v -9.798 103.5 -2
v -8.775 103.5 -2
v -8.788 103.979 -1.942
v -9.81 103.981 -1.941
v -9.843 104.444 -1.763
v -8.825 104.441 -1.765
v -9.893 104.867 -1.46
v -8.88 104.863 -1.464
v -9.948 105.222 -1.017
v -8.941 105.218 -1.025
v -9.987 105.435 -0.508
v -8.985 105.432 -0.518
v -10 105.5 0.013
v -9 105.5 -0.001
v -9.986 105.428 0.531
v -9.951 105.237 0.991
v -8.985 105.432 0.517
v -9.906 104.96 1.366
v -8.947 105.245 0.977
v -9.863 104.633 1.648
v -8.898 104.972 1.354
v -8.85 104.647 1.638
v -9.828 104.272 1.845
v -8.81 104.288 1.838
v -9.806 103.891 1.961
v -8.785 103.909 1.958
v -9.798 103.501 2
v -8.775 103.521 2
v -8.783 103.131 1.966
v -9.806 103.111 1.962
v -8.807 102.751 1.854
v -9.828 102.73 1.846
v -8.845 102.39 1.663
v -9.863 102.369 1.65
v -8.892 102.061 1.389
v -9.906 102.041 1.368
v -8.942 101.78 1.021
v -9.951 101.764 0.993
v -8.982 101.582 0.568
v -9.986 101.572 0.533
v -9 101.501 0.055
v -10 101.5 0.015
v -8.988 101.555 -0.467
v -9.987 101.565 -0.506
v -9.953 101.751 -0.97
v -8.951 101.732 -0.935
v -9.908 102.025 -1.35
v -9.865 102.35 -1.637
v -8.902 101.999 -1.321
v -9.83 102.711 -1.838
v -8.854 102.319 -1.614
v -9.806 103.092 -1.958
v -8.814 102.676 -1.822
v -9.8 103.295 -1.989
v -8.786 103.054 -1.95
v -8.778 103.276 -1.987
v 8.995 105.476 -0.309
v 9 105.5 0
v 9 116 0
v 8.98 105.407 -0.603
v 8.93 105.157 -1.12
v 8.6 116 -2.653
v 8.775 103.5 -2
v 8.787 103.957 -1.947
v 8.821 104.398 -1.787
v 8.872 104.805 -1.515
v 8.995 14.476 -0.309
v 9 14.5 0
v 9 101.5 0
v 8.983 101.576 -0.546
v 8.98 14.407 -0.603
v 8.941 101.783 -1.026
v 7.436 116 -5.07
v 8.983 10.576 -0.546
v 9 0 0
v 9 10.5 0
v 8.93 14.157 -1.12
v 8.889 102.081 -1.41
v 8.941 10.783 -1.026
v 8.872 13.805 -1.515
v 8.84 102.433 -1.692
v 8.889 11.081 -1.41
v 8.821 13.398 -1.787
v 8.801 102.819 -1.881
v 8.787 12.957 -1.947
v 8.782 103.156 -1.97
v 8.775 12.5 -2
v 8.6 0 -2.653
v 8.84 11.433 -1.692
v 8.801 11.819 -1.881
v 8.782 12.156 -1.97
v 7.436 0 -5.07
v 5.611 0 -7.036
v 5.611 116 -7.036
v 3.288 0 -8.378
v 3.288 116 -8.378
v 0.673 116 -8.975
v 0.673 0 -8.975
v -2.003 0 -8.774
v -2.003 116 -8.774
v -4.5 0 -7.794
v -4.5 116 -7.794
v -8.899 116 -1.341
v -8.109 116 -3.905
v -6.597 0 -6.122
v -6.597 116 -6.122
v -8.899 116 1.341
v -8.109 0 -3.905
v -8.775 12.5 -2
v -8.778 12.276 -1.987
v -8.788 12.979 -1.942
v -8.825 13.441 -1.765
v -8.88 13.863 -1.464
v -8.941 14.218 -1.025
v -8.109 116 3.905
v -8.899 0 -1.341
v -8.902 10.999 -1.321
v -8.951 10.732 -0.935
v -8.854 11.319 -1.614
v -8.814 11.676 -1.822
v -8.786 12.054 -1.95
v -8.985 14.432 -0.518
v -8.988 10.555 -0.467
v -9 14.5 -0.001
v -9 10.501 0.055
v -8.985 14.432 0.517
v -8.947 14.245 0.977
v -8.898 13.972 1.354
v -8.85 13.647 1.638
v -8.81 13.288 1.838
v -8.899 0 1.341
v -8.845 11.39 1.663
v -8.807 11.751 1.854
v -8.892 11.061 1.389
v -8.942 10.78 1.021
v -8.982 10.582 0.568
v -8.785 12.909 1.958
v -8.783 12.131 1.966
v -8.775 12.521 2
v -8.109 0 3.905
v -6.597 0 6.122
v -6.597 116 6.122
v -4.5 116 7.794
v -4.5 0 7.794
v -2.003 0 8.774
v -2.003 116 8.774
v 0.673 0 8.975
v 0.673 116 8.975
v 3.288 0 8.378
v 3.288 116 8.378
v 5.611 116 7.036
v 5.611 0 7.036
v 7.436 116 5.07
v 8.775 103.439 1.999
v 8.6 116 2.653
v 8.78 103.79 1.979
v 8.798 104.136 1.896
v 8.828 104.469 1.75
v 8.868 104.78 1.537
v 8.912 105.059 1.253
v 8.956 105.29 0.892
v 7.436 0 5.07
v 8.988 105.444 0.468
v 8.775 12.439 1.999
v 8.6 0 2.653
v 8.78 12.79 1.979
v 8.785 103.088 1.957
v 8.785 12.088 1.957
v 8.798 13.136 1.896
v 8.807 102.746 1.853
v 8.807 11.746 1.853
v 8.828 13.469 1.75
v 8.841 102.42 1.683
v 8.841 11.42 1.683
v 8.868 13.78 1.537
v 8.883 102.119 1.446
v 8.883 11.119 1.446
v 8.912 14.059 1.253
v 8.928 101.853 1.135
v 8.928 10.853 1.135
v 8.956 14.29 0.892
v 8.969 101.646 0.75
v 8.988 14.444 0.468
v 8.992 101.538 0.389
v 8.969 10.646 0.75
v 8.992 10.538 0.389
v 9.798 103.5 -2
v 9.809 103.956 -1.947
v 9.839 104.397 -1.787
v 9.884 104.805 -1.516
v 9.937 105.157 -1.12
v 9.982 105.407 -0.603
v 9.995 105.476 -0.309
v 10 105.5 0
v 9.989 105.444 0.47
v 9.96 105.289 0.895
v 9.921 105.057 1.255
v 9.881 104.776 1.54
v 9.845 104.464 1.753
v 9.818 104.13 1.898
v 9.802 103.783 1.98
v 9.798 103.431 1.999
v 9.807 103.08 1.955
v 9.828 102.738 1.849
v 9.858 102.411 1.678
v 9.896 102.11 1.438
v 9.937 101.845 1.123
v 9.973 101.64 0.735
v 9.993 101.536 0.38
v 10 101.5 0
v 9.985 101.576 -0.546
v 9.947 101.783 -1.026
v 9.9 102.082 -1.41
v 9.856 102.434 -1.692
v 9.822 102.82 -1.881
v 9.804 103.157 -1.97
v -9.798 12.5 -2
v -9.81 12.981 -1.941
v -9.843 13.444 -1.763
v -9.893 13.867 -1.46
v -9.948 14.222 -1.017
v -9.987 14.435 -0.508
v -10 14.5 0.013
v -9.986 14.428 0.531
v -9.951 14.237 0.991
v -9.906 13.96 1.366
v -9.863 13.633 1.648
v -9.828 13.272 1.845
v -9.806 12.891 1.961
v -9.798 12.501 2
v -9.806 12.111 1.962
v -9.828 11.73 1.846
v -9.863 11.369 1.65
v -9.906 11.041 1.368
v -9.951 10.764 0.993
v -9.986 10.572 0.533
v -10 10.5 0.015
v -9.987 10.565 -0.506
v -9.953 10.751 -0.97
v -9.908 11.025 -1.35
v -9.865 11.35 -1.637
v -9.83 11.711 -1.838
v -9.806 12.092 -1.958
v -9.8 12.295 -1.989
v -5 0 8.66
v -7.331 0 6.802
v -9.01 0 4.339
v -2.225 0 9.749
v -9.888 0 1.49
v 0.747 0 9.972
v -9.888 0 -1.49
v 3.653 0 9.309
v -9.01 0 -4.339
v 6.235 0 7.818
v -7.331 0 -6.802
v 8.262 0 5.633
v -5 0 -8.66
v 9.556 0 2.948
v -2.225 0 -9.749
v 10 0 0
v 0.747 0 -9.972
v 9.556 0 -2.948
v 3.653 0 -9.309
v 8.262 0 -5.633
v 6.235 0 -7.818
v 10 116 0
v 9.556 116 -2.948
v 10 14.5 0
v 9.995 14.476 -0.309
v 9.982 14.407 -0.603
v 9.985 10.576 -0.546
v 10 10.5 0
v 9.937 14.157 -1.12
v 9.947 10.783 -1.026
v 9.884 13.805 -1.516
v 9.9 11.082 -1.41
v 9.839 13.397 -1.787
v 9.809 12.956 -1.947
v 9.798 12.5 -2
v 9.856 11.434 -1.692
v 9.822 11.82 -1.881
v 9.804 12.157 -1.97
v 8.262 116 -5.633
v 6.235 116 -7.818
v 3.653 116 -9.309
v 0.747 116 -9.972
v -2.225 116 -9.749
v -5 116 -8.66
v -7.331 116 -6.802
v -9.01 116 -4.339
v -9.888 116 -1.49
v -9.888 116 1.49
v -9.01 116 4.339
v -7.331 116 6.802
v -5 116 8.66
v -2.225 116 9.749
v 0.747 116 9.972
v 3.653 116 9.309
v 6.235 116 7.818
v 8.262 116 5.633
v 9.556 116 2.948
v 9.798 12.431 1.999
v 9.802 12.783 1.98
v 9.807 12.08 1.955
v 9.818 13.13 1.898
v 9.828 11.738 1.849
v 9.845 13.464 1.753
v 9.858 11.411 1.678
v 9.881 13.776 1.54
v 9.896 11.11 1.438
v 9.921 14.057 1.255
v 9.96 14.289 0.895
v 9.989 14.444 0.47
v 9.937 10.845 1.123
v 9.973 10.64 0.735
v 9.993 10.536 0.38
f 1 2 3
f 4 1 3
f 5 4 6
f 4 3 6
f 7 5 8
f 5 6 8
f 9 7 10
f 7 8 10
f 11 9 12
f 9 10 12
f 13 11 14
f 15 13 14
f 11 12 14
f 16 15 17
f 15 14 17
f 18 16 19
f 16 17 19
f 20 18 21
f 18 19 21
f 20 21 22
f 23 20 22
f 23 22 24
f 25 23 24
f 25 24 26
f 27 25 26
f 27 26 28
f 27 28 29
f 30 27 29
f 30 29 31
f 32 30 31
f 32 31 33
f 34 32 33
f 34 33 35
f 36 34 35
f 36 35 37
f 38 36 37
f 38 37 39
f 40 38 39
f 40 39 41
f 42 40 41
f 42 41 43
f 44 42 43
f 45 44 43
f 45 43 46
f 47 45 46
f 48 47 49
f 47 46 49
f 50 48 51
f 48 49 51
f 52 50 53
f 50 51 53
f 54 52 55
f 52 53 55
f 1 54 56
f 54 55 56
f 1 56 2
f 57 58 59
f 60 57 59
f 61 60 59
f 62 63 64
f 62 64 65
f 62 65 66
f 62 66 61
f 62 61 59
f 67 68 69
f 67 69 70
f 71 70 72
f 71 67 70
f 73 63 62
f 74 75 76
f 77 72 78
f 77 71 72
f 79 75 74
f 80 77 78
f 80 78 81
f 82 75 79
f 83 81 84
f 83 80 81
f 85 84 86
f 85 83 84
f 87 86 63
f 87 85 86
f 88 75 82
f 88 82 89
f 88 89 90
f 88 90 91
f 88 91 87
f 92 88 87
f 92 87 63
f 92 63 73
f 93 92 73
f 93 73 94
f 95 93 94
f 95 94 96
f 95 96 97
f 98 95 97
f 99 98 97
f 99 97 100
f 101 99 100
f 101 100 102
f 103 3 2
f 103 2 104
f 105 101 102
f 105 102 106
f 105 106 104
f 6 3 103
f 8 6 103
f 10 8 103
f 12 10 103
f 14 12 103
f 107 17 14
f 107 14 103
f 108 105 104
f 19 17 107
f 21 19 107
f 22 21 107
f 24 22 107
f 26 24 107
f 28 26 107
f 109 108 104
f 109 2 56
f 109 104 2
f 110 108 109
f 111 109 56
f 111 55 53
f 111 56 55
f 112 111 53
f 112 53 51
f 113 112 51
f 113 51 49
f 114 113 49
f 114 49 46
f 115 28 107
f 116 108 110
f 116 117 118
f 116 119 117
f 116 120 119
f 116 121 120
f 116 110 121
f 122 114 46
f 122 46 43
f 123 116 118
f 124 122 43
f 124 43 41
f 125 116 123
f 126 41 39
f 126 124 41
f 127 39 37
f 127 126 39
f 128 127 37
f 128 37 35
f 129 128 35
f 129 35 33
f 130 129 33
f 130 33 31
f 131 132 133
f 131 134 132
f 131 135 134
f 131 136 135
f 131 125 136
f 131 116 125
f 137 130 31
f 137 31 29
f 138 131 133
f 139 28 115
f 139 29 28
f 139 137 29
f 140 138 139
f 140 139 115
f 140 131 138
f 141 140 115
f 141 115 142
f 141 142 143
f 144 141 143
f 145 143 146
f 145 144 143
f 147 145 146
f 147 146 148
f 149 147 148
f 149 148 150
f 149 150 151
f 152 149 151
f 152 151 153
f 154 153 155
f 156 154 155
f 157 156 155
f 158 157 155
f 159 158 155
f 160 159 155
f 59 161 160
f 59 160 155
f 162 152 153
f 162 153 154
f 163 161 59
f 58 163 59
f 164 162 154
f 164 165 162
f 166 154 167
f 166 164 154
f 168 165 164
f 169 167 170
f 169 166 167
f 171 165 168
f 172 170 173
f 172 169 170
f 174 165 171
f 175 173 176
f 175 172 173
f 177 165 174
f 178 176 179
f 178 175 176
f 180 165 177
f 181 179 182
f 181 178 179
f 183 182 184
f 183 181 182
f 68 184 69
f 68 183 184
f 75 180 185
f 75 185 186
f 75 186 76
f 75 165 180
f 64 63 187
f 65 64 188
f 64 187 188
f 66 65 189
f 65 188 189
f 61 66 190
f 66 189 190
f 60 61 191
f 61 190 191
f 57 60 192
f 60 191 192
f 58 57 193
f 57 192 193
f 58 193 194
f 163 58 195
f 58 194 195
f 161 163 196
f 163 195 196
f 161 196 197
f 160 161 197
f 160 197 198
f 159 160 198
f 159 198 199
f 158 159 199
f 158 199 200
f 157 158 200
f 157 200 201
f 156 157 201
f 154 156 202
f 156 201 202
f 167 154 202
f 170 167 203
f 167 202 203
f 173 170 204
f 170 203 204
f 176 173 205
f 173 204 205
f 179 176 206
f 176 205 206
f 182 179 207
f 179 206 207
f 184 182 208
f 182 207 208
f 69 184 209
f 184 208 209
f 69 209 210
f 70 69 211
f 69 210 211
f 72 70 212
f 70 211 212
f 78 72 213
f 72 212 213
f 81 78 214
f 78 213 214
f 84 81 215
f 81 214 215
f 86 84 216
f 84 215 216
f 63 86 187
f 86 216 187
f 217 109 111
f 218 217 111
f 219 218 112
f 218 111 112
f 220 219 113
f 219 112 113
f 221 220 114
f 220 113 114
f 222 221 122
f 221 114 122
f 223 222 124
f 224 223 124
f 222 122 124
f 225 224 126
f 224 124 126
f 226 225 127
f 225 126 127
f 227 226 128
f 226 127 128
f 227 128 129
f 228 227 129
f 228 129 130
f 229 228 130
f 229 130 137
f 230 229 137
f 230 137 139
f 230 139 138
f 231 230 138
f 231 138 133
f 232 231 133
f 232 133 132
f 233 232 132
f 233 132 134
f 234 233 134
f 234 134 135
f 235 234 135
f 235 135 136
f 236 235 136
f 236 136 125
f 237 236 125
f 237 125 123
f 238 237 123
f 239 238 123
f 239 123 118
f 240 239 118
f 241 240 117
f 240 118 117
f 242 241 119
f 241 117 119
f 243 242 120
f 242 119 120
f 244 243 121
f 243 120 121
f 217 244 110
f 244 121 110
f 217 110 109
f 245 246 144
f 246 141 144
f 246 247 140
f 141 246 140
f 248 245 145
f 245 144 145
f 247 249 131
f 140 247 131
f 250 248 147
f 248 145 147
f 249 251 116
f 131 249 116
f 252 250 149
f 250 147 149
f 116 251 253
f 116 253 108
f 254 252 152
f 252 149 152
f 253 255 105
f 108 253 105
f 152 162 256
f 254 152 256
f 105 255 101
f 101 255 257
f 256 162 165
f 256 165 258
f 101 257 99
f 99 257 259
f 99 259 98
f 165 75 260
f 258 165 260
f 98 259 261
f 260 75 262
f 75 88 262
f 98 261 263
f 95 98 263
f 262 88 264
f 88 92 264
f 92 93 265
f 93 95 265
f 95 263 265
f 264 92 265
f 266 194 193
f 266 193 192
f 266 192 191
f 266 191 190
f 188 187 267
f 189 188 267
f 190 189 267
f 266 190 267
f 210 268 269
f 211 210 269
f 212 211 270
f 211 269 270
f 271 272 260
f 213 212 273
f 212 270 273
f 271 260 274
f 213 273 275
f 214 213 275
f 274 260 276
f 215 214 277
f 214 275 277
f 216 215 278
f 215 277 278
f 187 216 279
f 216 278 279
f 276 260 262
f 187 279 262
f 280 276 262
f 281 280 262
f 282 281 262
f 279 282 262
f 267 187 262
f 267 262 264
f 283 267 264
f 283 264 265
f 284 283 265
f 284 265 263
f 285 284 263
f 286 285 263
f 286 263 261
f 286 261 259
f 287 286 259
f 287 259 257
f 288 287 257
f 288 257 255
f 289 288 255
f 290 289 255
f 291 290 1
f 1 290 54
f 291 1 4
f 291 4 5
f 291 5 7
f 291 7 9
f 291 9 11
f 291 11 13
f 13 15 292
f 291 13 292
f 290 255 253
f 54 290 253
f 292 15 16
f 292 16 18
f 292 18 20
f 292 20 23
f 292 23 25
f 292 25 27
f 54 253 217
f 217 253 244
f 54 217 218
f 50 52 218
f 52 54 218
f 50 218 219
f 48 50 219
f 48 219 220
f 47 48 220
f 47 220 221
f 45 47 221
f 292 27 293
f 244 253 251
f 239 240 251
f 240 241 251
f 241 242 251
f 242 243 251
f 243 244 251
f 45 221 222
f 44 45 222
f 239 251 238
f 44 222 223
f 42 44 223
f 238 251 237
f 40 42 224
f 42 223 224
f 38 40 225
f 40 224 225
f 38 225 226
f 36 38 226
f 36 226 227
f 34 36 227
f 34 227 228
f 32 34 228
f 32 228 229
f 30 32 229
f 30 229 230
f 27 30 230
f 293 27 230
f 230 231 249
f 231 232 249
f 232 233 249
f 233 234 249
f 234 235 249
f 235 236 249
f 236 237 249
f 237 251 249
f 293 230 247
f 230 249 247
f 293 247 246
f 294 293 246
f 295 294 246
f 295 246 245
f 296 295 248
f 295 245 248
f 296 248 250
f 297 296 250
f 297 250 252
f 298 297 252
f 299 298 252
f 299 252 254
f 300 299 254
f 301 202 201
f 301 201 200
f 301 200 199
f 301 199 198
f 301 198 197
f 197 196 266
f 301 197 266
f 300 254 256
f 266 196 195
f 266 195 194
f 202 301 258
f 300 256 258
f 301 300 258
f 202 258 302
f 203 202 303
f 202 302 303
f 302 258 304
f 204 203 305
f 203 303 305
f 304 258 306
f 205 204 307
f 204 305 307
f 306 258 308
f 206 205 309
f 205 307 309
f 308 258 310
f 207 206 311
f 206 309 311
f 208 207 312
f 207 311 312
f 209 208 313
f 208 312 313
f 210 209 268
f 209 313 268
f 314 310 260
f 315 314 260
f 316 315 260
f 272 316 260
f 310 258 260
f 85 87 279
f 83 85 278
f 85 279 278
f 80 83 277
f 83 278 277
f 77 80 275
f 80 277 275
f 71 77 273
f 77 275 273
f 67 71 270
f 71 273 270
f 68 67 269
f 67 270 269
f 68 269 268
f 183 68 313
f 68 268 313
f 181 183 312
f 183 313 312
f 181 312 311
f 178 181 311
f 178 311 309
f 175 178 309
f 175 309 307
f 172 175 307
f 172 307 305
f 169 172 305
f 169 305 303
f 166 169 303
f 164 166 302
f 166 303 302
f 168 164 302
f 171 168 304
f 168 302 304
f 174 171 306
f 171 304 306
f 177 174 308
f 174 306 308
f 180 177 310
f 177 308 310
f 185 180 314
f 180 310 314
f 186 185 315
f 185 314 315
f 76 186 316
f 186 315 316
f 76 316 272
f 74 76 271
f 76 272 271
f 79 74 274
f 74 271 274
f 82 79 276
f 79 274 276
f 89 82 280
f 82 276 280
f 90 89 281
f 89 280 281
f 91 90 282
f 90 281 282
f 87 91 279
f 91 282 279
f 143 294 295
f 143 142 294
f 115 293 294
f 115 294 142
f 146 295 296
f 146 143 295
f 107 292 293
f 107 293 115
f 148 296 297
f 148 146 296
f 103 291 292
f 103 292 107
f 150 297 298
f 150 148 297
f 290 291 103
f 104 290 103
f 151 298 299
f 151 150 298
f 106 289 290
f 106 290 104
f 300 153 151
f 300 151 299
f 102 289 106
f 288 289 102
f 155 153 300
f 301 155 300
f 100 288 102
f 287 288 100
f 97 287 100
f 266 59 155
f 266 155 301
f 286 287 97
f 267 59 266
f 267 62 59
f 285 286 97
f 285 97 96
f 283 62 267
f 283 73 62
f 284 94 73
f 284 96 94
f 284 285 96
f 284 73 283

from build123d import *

# Parameters (mm, degrees)
SKETCH1_R           = 10
SKETCH1_R_2         = 9
BOSS_EXTRUDE1_DEPTH = 116
SKETCH3_R           = 2
CUT_EXTRUDE2_DEPTH  = 21


with BuildPart() as part:
    # Sketch1 → Boss-Extrude1 (new body)
    with BuildSketch(Plane(origin=(0, 0, 0), x_dir=(1, 0, 0), z_dir=(0, 1, 0))):
        Circle(SKETCH1_R)
        Circle(SKETCH1_R_2, mode=Mode.SUBTRACT)
    extrude(amount=BOSS_EXTRUDE1_DEPTH)

    # Sketch3 → Cut-Extrude2 (cut, through all)
    with BuildSketch(Plane(origin=(10, 0, 0), x_dir=(0, 0, -1), z_dir=(1, 0, 0))):
        with Locations((0, 103.5)):
            Circle(SKETCH3_R)
        with Locations((0, 12.5)):
            Circle(SKETCH3_R)
    extrude(amount=-CUT_EXTRUDE2_DEPTH, mode=Mode.SUBTRACT)


solid = part.part
